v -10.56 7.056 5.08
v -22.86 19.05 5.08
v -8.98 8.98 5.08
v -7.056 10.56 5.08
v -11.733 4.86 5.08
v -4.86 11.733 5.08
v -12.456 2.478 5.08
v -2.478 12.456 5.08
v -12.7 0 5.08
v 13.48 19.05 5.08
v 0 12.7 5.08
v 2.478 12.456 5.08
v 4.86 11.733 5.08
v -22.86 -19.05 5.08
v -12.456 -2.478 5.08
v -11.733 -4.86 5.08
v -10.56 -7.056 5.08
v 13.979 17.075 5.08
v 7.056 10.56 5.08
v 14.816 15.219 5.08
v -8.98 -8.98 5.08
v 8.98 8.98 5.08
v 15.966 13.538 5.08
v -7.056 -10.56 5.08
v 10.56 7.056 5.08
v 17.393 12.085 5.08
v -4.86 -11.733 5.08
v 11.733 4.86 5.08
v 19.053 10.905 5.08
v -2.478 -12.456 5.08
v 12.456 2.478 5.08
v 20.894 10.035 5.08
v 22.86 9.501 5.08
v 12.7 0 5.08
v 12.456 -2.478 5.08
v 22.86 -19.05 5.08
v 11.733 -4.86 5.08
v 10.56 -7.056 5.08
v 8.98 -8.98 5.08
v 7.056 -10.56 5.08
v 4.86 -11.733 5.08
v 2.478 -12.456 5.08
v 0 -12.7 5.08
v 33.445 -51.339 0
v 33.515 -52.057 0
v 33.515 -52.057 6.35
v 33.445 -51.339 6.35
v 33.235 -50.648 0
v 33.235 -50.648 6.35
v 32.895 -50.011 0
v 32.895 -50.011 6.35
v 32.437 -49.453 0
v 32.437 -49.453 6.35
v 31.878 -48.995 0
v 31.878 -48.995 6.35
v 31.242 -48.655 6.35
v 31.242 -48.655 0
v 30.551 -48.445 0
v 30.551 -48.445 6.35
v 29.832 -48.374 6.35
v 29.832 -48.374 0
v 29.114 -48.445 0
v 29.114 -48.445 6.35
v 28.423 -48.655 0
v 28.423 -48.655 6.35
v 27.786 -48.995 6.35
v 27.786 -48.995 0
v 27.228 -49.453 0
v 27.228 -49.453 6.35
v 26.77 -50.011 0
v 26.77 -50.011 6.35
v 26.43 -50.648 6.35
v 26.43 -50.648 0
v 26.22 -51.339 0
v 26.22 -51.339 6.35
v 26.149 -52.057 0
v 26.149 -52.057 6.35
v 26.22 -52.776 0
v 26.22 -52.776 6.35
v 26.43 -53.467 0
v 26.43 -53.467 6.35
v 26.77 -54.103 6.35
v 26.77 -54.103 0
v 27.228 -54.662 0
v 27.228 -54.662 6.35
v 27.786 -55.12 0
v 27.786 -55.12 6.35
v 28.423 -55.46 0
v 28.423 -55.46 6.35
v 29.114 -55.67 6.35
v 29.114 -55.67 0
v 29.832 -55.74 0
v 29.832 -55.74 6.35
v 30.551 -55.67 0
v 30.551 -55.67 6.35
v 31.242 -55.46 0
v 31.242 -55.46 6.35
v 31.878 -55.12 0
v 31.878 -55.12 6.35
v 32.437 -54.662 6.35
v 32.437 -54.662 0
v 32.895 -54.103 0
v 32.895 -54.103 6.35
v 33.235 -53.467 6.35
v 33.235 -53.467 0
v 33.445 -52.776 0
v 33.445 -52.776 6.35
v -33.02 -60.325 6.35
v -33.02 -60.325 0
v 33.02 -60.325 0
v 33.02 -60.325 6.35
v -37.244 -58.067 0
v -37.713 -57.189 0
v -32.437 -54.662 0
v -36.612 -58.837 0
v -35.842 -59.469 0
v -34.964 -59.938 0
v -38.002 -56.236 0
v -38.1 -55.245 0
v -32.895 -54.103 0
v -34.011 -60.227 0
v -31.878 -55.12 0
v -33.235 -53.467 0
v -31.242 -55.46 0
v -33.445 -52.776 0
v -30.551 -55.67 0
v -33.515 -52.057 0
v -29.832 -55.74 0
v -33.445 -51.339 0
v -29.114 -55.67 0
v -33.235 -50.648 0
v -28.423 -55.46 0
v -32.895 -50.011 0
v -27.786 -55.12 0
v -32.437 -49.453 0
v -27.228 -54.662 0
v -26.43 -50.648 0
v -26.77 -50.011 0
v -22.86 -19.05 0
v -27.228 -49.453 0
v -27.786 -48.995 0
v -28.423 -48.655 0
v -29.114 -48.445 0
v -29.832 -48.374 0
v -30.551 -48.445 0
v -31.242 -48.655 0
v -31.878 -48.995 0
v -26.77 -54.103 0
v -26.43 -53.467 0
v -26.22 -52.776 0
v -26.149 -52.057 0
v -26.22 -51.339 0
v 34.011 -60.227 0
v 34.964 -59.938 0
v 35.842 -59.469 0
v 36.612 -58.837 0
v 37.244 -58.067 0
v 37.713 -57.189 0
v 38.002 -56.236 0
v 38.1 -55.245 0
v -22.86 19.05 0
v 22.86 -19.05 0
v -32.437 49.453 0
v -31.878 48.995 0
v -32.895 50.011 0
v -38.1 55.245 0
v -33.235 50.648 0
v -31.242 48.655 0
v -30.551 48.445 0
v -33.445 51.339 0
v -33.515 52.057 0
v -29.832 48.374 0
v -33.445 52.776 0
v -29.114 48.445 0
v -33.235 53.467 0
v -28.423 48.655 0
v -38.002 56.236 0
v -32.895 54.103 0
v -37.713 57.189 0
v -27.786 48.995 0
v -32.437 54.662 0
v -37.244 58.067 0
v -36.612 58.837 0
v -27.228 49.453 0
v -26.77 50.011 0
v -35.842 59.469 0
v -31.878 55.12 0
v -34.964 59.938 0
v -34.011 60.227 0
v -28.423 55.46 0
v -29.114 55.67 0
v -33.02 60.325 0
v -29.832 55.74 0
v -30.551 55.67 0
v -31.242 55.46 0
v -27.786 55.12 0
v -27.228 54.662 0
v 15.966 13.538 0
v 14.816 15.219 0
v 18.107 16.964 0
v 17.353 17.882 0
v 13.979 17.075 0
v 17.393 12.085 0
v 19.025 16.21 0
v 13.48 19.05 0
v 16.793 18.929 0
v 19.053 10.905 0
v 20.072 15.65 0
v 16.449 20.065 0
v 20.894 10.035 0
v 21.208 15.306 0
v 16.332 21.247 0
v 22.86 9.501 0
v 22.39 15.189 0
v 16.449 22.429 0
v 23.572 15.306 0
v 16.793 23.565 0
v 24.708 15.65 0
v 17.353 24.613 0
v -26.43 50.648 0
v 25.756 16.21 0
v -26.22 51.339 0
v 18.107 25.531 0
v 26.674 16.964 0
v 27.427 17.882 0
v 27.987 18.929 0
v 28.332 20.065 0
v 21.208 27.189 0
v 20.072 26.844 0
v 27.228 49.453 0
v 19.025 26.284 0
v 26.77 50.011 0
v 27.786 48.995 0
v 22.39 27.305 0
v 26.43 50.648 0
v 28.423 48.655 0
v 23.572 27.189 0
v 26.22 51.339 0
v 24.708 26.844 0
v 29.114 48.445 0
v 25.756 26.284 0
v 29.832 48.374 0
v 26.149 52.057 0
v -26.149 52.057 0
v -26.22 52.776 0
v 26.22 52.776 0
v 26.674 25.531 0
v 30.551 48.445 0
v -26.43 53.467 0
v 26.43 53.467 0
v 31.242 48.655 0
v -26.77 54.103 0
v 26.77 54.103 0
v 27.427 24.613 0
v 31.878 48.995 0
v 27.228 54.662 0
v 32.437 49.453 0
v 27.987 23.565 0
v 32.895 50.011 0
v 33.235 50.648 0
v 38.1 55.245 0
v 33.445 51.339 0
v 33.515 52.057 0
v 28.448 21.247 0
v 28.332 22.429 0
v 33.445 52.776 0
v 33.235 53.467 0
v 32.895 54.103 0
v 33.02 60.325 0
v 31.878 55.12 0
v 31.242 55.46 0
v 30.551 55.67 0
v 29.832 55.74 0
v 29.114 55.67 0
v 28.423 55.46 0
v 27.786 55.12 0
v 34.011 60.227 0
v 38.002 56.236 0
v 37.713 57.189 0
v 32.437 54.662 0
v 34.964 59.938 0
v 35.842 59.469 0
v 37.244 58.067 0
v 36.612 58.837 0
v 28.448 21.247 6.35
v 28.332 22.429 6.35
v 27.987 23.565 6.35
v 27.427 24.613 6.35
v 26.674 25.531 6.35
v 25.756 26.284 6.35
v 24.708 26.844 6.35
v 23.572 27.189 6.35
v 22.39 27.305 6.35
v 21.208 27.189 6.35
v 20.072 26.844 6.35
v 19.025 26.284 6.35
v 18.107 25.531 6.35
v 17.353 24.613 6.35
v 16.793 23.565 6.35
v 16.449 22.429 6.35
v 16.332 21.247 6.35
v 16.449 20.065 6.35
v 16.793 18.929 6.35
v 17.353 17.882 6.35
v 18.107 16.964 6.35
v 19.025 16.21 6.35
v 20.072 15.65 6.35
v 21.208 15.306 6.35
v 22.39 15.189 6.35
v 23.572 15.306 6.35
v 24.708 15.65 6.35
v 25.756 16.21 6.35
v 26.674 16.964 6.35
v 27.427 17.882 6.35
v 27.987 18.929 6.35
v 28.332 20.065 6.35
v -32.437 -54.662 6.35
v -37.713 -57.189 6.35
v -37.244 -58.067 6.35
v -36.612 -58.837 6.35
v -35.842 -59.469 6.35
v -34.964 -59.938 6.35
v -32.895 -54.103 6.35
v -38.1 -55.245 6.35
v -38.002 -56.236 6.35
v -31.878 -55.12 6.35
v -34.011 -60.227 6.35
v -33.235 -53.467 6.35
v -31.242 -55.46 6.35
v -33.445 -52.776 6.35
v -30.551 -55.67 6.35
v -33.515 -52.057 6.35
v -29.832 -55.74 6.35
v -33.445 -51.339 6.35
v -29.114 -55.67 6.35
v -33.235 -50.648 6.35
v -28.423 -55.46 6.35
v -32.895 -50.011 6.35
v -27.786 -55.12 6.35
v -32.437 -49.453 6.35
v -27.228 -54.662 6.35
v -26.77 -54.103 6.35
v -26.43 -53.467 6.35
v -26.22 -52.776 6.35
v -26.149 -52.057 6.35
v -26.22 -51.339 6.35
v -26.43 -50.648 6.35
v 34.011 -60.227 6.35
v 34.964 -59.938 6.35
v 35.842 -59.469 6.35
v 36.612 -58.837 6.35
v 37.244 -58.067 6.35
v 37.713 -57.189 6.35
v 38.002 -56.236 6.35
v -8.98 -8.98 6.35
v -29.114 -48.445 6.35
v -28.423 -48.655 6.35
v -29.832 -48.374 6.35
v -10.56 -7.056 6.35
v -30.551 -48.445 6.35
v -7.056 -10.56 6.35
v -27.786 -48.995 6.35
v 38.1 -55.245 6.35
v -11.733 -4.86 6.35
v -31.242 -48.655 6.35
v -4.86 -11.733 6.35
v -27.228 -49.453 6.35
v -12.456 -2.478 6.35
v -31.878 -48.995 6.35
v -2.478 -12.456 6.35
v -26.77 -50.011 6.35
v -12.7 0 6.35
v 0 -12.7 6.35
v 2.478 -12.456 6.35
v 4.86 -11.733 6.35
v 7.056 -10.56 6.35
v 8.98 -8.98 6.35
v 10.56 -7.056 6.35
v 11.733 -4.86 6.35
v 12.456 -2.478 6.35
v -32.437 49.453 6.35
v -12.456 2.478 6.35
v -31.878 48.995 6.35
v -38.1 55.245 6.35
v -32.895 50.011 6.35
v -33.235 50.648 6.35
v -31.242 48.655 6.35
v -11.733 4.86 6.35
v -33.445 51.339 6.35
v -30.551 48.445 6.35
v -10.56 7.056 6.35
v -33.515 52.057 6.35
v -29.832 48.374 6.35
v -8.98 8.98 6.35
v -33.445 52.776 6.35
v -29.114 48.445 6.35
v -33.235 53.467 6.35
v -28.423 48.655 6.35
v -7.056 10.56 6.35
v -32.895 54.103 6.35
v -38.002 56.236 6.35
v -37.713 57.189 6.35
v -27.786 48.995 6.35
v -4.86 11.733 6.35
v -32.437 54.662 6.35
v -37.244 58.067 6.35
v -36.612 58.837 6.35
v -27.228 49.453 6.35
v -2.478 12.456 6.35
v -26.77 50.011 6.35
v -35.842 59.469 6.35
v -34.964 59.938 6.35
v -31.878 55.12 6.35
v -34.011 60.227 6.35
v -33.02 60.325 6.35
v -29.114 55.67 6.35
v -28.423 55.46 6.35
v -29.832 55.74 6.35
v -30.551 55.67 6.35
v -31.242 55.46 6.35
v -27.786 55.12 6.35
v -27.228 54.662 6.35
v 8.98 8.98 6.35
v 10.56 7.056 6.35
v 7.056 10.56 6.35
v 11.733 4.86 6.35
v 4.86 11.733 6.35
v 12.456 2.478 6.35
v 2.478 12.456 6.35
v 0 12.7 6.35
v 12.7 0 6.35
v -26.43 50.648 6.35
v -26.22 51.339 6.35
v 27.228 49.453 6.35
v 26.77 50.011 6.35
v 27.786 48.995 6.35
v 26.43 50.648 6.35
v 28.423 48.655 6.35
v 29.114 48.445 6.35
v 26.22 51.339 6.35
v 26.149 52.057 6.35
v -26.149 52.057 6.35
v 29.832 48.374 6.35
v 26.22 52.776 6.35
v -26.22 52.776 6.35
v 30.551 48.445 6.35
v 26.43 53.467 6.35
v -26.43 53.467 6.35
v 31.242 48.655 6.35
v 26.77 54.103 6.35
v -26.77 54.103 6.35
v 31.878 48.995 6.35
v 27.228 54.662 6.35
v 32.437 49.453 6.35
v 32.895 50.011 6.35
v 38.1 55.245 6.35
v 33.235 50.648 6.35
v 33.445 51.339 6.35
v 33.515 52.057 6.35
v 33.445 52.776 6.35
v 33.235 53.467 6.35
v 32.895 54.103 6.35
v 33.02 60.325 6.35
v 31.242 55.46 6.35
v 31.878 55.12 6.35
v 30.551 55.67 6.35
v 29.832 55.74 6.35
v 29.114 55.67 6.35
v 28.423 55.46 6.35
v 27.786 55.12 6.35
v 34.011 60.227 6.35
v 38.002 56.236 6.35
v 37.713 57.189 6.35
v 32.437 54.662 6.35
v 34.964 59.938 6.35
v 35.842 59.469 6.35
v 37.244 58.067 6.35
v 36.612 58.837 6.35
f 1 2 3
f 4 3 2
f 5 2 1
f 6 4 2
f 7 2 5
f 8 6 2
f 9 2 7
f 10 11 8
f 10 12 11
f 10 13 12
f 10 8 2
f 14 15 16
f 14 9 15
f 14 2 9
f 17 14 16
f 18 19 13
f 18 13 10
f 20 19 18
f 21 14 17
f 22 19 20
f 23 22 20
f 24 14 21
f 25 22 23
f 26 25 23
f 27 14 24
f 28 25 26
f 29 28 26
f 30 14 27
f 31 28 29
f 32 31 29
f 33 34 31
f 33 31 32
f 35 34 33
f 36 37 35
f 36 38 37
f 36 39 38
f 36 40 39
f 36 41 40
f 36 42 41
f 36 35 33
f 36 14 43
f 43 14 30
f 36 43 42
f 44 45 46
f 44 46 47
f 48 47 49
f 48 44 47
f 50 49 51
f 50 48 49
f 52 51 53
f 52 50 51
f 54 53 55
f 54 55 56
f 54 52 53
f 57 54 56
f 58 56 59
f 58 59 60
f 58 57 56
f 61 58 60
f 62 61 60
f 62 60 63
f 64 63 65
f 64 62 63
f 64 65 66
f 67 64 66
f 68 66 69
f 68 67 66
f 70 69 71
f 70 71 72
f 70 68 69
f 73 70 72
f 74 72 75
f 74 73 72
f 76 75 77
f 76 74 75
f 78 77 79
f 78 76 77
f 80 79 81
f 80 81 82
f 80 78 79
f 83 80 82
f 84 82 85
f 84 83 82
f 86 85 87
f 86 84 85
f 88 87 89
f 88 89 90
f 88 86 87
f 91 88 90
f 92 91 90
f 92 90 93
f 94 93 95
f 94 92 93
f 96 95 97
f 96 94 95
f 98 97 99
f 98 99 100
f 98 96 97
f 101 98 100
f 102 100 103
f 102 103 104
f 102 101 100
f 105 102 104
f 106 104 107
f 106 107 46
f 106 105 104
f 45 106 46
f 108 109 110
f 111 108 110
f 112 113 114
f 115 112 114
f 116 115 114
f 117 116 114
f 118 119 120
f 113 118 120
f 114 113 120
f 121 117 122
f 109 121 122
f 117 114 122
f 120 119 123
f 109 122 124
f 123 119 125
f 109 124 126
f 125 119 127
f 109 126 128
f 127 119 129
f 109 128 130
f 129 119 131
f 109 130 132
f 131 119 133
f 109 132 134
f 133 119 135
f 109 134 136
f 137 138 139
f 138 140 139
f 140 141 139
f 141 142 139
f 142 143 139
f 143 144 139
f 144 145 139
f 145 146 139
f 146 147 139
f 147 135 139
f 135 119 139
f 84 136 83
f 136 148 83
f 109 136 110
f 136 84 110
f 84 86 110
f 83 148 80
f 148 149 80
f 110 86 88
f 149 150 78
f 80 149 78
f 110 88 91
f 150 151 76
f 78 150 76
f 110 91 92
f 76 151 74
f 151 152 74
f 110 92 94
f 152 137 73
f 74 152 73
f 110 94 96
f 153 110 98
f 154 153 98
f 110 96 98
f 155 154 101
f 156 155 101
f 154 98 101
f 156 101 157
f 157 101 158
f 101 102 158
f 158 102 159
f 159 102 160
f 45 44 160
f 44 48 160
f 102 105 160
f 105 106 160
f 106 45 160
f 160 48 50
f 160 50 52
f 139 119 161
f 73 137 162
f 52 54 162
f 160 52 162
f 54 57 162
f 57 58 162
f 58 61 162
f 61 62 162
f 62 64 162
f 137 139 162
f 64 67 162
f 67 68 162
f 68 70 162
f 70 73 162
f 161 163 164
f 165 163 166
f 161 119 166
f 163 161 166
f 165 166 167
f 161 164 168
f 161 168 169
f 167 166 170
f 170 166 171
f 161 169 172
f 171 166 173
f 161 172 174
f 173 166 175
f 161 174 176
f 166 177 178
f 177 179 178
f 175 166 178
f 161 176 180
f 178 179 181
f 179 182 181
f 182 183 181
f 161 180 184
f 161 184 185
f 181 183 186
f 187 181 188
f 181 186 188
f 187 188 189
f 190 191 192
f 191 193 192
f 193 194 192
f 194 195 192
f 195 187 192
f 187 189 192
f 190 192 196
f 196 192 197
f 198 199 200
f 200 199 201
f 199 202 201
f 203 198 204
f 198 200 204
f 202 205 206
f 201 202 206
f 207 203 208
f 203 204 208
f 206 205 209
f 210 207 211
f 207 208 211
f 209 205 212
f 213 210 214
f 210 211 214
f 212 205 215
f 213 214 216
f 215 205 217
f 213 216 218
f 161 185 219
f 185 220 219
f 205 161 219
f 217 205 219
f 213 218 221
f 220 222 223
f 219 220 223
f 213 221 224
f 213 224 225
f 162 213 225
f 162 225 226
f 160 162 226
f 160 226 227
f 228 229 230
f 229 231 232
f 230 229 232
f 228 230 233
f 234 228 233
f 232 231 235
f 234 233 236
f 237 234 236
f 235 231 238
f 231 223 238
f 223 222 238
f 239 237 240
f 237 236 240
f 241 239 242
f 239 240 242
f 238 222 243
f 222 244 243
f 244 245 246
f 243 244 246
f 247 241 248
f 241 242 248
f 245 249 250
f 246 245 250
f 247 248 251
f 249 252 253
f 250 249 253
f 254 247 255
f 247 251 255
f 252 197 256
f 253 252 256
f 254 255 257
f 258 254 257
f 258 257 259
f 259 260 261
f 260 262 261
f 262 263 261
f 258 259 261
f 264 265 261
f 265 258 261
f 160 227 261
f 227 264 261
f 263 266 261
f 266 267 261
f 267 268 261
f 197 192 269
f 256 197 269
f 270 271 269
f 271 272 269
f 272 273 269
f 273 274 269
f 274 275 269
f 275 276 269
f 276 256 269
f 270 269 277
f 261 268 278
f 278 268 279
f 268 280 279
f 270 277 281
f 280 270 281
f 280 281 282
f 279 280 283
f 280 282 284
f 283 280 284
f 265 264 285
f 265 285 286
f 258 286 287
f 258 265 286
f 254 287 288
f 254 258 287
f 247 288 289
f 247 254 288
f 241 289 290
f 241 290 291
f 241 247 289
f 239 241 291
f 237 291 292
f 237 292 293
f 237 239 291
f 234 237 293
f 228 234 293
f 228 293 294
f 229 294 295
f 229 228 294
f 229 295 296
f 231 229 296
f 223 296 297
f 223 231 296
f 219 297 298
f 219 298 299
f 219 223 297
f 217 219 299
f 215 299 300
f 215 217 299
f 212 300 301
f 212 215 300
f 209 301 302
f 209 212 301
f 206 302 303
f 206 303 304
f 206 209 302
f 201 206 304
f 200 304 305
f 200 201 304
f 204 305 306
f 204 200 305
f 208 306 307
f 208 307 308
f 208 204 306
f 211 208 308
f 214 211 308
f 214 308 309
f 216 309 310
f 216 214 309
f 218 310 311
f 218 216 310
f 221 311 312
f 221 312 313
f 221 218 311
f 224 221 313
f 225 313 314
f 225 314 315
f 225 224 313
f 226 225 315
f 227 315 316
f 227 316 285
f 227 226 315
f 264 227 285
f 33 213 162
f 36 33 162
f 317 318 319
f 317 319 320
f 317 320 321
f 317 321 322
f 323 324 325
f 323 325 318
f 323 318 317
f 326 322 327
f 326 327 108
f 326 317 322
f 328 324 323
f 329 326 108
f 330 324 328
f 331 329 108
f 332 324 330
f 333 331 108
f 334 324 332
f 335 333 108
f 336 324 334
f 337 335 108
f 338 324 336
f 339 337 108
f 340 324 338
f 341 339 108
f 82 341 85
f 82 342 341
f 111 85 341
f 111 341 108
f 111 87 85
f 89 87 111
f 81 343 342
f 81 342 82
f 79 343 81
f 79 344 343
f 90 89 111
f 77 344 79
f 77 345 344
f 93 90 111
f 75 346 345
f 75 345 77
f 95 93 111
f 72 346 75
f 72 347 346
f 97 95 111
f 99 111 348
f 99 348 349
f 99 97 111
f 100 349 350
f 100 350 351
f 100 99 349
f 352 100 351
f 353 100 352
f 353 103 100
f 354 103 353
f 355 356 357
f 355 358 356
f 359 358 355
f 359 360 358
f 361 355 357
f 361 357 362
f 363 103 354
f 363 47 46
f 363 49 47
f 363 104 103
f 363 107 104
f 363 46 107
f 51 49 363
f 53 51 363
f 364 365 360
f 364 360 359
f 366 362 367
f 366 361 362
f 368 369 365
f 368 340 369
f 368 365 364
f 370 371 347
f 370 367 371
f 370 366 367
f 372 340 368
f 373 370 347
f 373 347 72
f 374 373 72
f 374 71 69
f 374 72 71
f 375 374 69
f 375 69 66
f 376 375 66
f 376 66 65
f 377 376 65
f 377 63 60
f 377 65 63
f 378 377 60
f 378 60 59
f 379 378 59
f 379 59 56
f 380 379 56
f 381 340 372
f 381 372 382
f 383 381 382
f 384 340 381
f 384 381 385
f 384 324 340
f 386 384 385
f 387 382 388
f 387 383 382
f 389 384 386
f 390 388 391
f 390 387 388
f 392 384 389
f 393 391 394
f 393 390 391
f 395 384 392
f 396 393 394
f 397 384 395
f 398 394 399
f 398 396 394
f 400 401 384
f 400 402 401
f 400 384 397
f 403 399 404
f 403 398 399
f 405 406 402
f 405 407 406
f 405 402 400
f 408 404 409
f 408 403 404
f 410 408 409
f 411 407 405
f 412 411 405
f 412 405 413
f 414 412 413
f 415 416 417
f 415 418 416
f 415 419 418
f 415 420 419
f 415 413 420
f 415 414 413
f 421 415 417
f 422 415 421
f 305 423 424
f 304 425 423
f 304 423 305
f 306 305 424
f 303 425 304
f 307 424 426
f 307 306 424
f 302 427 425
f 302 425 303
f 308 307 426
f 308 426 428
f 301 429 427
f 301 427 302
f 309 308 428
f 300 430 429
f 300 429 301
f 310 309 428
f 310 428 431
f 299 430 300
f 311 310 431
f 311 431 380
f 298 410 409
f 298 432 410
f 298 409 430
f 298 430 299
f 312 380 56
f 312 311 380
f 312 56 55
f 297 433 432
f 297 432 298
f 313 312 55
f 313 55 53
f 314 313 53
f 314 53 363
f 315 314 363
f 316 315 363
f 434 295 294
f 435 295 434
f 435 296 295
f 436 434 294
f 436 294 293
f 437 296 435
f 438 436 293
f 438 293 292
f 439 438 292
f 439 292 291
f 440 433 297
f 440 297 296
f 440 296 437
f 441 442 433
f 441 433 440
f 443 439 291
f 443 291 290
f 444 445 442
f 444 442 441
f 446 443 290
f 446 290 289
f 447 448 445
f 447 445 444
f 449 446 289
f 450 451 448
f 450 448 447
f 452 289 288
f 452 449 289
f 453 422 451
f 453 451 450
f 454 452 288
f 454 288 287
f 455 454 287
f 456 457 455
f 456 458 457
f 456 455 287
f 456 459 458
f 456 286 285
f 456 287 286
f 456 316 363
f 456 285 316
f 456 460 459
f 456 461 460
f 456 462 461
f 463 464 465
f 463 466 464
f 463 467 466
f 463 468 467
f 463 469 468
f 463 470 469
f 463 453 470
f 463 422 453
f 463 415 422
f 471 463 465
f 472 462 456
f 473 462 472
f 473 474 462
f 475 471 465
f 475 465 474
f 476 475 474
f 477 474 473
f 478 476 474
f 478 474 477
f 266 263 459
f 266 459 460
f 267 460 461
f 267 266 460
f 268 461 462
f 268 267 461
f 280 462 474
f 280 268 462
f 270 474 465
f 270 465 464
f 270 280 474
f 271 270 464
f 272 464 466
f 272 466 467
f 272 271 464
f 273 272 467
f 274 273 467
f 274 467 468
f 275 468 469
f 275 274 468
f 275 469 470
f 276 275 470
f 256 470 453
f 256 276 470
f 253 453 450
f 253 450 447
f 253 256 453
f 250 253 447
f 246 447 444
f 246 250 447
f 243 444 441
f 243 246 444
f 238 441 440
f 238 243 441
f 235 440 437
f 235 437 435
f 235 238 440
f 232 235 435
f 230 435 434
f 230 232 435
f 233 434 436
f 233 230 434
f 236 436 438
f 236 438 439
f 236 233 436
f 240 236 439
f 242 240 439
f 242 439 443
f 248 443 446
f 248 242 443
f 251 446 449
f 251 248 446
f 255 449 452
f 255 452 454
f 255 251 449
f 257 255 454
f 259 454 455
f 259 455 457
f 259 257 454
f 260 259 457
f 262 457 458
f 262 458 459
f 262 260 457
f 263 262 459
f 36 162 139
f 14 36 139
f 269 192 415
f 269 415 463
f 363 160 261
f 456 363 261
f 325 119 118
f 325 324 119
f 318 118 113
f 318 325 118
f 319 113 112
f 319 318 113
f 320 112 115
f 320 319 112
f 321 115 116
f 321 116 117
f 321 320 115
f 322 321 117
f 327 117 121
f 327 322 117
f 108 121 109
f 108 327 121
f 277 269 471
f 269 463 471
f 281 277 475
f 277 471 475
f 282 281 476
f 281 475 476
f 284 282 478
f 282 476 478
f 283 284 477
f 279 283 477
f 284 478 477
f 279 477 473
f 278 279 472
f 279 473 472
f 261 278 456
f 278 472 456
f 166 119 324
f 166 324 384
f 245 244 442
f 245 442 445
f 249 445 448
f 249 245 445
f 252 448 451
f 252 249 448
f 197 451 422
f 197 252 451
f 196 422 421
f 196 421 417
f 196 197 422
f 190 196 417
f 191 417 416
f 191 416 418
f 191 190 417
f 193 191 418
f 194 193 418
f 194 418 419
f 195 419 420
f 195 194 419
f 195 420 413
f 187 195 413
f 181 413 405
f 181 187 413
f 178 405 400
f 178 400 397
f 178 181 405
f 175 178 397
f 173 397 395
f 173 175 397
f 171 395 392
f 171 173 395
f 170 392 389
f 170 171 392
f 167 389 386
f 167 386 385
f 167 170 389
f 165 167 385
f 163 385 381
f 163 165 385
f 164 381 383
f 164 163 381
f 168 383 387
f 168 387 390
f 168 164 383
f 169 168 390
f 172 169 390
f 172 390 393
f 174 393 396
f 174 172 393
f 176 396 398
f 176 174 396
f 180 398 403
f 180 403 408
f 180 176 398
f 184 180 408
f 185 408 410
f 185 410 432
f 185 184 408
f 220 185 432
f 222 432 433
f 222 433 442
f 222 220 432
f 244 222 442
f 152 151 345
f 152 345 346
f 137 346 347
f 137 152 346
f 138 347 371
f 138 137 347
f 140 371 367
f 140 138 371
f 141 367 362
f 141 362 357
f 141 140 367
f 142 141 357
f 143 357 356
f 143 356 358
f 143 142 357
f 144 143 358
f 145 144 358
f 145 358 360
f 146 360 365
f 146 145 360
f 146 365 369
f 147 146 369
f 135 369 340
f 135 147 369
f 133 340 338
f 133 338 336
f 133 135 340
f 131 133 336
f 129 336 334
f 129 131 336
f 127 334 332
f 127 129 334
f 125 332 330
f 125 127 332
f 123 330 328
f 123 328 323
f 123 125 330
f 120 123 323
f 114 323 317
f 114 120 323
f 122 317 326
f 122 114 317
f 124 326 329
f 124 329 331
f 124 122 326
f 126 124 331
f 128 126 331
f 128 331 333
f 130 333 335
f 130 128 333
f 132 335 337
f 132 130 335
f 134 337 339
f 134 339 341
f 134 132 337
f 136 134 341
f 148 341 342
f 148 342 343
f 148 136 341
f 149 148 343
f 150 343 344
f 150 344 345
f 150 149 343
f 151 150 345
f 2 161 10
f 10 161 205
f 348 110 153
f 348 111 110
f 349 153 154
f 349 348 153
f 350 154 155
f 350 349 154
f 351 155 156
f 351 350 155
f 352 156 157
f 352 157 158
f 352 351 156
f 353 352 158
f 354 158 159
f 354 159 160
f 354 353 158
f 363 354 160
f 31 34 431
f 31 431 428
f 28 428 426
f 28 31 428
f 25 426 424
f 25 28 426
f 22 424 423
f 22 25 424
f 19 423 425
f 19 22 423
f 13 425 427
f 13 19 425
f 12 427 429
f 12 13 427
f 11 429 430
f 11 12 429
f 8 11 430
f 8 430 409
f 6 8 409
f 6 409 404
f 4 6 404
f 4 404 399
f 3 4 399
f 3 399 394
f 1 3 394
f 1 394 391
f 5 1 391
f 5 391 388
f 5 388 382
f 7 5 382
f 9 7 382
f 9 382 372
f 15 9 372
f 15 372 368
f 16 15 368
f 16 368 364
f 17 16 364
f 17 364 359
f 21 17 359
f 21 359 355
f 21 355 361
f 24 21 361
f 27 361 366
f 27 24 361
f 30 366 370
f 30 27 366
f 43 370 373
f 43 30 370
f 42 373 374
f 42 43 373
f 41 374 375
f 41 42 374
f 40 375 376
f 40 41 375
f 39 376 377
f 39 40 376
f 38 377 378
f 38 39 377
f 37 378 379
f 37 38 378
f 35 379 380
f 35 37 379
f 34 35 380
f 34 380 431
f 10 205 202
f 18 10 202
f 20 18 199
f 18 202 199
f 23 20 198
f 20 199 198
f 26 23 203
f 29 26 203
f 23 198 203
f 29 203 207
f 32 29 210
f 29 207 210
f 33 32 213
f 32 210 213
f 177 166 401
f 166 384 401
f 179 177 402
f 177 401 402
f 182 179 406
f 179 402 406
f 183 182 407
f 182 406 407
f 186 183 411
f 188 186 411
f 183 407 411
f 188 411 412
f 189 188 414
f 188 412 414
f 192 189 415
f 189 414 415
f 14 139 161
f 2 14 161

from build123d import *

# Parameters (mm, degrees)
F0_W     = 76.2
F0_H     = 120.65
F0_R     = 3.683
F0_R_2   = 12.7
F0_R_3   = 6.0579
F1_DEPTH = 6.35
F2_R     = 5.08
F3_R     = 12.7
F4_DEPTH = 5.08


# Not quite as in the source:
# - a length typed as a fraction of an inch, garbled in the dataset ("3 / 203.2 mm" for 3/8 in), is restored


with BuildPart() as f1:
    # F0 (on Top) → F1 (new body)
    with BuildSketch(Plane.XY):
        Rectangle(F0_W, F0_H)
        with Locations((-29.8323, -52.0573)):
            Circle(F0_R, mode=Mode.SUBTRACT)
        with Locations((29.8323, -52.0573)):
            Circle(F0_R, mode=Mode.SUBTRACT)
        with Locations((-29.8323, 52.0573)):
            Circle(F0_R, mode=Mode.SUBTRACT)
        Circle(F0_R_2, mode=Mode.SUBTRACT)
        with Locations((22.3901, 21.2471)):
            Circle(F0_R_3, mode=Mode.SUBTRACT)
        with Locations((29.8323, 52.0573)):
            Circle(F0_R, mode=Mode.SUBTRACT)
    extrude(amount=F1_DEPTH)

    # F2
    f2_edges = [f1.edges().sort_by_distance(p)[0] for p in [
        (38.1, -60.325, 3.175),
        (-38.1, 60.325, 3.175),
        (38.1, 60.325, 3.175),
        (-38.1, -60.325, 3.175),
    ]]
    fillet(f2_edges, radius=F2_R)

    # F3 (on face) → F4 (cut)
    with BuildSketch(Plane(origin=(0, 0, 0), x_dir=(1, 0, 0), z_dir=(0, 0, -1))):
        with BuildLine():
            Line((22.86, 19.05), (14.4386043259, 19.05))
            Line((14.4386043259, 19.05), (-22.86, 19.05))
            Line((-22.86, 19.05), (-22.86, -19.05))
            Line((-22.86, -19.05), (13.4802116102, -19.05))
            ThreePointArc((13.4802116102, -19.05), (16.6474146742, -12.7797644882), (22.86, -9.5009213703))
            Line((22.86, -9.5009213703), (22.86, 19.05))
        make_face()
        Circle(F3_R, mode=Mode.SUBTRACT)
    extrude(amount=-F4_DEPTH, mode=Mode.SUBTRACT)


solid = f1.part
